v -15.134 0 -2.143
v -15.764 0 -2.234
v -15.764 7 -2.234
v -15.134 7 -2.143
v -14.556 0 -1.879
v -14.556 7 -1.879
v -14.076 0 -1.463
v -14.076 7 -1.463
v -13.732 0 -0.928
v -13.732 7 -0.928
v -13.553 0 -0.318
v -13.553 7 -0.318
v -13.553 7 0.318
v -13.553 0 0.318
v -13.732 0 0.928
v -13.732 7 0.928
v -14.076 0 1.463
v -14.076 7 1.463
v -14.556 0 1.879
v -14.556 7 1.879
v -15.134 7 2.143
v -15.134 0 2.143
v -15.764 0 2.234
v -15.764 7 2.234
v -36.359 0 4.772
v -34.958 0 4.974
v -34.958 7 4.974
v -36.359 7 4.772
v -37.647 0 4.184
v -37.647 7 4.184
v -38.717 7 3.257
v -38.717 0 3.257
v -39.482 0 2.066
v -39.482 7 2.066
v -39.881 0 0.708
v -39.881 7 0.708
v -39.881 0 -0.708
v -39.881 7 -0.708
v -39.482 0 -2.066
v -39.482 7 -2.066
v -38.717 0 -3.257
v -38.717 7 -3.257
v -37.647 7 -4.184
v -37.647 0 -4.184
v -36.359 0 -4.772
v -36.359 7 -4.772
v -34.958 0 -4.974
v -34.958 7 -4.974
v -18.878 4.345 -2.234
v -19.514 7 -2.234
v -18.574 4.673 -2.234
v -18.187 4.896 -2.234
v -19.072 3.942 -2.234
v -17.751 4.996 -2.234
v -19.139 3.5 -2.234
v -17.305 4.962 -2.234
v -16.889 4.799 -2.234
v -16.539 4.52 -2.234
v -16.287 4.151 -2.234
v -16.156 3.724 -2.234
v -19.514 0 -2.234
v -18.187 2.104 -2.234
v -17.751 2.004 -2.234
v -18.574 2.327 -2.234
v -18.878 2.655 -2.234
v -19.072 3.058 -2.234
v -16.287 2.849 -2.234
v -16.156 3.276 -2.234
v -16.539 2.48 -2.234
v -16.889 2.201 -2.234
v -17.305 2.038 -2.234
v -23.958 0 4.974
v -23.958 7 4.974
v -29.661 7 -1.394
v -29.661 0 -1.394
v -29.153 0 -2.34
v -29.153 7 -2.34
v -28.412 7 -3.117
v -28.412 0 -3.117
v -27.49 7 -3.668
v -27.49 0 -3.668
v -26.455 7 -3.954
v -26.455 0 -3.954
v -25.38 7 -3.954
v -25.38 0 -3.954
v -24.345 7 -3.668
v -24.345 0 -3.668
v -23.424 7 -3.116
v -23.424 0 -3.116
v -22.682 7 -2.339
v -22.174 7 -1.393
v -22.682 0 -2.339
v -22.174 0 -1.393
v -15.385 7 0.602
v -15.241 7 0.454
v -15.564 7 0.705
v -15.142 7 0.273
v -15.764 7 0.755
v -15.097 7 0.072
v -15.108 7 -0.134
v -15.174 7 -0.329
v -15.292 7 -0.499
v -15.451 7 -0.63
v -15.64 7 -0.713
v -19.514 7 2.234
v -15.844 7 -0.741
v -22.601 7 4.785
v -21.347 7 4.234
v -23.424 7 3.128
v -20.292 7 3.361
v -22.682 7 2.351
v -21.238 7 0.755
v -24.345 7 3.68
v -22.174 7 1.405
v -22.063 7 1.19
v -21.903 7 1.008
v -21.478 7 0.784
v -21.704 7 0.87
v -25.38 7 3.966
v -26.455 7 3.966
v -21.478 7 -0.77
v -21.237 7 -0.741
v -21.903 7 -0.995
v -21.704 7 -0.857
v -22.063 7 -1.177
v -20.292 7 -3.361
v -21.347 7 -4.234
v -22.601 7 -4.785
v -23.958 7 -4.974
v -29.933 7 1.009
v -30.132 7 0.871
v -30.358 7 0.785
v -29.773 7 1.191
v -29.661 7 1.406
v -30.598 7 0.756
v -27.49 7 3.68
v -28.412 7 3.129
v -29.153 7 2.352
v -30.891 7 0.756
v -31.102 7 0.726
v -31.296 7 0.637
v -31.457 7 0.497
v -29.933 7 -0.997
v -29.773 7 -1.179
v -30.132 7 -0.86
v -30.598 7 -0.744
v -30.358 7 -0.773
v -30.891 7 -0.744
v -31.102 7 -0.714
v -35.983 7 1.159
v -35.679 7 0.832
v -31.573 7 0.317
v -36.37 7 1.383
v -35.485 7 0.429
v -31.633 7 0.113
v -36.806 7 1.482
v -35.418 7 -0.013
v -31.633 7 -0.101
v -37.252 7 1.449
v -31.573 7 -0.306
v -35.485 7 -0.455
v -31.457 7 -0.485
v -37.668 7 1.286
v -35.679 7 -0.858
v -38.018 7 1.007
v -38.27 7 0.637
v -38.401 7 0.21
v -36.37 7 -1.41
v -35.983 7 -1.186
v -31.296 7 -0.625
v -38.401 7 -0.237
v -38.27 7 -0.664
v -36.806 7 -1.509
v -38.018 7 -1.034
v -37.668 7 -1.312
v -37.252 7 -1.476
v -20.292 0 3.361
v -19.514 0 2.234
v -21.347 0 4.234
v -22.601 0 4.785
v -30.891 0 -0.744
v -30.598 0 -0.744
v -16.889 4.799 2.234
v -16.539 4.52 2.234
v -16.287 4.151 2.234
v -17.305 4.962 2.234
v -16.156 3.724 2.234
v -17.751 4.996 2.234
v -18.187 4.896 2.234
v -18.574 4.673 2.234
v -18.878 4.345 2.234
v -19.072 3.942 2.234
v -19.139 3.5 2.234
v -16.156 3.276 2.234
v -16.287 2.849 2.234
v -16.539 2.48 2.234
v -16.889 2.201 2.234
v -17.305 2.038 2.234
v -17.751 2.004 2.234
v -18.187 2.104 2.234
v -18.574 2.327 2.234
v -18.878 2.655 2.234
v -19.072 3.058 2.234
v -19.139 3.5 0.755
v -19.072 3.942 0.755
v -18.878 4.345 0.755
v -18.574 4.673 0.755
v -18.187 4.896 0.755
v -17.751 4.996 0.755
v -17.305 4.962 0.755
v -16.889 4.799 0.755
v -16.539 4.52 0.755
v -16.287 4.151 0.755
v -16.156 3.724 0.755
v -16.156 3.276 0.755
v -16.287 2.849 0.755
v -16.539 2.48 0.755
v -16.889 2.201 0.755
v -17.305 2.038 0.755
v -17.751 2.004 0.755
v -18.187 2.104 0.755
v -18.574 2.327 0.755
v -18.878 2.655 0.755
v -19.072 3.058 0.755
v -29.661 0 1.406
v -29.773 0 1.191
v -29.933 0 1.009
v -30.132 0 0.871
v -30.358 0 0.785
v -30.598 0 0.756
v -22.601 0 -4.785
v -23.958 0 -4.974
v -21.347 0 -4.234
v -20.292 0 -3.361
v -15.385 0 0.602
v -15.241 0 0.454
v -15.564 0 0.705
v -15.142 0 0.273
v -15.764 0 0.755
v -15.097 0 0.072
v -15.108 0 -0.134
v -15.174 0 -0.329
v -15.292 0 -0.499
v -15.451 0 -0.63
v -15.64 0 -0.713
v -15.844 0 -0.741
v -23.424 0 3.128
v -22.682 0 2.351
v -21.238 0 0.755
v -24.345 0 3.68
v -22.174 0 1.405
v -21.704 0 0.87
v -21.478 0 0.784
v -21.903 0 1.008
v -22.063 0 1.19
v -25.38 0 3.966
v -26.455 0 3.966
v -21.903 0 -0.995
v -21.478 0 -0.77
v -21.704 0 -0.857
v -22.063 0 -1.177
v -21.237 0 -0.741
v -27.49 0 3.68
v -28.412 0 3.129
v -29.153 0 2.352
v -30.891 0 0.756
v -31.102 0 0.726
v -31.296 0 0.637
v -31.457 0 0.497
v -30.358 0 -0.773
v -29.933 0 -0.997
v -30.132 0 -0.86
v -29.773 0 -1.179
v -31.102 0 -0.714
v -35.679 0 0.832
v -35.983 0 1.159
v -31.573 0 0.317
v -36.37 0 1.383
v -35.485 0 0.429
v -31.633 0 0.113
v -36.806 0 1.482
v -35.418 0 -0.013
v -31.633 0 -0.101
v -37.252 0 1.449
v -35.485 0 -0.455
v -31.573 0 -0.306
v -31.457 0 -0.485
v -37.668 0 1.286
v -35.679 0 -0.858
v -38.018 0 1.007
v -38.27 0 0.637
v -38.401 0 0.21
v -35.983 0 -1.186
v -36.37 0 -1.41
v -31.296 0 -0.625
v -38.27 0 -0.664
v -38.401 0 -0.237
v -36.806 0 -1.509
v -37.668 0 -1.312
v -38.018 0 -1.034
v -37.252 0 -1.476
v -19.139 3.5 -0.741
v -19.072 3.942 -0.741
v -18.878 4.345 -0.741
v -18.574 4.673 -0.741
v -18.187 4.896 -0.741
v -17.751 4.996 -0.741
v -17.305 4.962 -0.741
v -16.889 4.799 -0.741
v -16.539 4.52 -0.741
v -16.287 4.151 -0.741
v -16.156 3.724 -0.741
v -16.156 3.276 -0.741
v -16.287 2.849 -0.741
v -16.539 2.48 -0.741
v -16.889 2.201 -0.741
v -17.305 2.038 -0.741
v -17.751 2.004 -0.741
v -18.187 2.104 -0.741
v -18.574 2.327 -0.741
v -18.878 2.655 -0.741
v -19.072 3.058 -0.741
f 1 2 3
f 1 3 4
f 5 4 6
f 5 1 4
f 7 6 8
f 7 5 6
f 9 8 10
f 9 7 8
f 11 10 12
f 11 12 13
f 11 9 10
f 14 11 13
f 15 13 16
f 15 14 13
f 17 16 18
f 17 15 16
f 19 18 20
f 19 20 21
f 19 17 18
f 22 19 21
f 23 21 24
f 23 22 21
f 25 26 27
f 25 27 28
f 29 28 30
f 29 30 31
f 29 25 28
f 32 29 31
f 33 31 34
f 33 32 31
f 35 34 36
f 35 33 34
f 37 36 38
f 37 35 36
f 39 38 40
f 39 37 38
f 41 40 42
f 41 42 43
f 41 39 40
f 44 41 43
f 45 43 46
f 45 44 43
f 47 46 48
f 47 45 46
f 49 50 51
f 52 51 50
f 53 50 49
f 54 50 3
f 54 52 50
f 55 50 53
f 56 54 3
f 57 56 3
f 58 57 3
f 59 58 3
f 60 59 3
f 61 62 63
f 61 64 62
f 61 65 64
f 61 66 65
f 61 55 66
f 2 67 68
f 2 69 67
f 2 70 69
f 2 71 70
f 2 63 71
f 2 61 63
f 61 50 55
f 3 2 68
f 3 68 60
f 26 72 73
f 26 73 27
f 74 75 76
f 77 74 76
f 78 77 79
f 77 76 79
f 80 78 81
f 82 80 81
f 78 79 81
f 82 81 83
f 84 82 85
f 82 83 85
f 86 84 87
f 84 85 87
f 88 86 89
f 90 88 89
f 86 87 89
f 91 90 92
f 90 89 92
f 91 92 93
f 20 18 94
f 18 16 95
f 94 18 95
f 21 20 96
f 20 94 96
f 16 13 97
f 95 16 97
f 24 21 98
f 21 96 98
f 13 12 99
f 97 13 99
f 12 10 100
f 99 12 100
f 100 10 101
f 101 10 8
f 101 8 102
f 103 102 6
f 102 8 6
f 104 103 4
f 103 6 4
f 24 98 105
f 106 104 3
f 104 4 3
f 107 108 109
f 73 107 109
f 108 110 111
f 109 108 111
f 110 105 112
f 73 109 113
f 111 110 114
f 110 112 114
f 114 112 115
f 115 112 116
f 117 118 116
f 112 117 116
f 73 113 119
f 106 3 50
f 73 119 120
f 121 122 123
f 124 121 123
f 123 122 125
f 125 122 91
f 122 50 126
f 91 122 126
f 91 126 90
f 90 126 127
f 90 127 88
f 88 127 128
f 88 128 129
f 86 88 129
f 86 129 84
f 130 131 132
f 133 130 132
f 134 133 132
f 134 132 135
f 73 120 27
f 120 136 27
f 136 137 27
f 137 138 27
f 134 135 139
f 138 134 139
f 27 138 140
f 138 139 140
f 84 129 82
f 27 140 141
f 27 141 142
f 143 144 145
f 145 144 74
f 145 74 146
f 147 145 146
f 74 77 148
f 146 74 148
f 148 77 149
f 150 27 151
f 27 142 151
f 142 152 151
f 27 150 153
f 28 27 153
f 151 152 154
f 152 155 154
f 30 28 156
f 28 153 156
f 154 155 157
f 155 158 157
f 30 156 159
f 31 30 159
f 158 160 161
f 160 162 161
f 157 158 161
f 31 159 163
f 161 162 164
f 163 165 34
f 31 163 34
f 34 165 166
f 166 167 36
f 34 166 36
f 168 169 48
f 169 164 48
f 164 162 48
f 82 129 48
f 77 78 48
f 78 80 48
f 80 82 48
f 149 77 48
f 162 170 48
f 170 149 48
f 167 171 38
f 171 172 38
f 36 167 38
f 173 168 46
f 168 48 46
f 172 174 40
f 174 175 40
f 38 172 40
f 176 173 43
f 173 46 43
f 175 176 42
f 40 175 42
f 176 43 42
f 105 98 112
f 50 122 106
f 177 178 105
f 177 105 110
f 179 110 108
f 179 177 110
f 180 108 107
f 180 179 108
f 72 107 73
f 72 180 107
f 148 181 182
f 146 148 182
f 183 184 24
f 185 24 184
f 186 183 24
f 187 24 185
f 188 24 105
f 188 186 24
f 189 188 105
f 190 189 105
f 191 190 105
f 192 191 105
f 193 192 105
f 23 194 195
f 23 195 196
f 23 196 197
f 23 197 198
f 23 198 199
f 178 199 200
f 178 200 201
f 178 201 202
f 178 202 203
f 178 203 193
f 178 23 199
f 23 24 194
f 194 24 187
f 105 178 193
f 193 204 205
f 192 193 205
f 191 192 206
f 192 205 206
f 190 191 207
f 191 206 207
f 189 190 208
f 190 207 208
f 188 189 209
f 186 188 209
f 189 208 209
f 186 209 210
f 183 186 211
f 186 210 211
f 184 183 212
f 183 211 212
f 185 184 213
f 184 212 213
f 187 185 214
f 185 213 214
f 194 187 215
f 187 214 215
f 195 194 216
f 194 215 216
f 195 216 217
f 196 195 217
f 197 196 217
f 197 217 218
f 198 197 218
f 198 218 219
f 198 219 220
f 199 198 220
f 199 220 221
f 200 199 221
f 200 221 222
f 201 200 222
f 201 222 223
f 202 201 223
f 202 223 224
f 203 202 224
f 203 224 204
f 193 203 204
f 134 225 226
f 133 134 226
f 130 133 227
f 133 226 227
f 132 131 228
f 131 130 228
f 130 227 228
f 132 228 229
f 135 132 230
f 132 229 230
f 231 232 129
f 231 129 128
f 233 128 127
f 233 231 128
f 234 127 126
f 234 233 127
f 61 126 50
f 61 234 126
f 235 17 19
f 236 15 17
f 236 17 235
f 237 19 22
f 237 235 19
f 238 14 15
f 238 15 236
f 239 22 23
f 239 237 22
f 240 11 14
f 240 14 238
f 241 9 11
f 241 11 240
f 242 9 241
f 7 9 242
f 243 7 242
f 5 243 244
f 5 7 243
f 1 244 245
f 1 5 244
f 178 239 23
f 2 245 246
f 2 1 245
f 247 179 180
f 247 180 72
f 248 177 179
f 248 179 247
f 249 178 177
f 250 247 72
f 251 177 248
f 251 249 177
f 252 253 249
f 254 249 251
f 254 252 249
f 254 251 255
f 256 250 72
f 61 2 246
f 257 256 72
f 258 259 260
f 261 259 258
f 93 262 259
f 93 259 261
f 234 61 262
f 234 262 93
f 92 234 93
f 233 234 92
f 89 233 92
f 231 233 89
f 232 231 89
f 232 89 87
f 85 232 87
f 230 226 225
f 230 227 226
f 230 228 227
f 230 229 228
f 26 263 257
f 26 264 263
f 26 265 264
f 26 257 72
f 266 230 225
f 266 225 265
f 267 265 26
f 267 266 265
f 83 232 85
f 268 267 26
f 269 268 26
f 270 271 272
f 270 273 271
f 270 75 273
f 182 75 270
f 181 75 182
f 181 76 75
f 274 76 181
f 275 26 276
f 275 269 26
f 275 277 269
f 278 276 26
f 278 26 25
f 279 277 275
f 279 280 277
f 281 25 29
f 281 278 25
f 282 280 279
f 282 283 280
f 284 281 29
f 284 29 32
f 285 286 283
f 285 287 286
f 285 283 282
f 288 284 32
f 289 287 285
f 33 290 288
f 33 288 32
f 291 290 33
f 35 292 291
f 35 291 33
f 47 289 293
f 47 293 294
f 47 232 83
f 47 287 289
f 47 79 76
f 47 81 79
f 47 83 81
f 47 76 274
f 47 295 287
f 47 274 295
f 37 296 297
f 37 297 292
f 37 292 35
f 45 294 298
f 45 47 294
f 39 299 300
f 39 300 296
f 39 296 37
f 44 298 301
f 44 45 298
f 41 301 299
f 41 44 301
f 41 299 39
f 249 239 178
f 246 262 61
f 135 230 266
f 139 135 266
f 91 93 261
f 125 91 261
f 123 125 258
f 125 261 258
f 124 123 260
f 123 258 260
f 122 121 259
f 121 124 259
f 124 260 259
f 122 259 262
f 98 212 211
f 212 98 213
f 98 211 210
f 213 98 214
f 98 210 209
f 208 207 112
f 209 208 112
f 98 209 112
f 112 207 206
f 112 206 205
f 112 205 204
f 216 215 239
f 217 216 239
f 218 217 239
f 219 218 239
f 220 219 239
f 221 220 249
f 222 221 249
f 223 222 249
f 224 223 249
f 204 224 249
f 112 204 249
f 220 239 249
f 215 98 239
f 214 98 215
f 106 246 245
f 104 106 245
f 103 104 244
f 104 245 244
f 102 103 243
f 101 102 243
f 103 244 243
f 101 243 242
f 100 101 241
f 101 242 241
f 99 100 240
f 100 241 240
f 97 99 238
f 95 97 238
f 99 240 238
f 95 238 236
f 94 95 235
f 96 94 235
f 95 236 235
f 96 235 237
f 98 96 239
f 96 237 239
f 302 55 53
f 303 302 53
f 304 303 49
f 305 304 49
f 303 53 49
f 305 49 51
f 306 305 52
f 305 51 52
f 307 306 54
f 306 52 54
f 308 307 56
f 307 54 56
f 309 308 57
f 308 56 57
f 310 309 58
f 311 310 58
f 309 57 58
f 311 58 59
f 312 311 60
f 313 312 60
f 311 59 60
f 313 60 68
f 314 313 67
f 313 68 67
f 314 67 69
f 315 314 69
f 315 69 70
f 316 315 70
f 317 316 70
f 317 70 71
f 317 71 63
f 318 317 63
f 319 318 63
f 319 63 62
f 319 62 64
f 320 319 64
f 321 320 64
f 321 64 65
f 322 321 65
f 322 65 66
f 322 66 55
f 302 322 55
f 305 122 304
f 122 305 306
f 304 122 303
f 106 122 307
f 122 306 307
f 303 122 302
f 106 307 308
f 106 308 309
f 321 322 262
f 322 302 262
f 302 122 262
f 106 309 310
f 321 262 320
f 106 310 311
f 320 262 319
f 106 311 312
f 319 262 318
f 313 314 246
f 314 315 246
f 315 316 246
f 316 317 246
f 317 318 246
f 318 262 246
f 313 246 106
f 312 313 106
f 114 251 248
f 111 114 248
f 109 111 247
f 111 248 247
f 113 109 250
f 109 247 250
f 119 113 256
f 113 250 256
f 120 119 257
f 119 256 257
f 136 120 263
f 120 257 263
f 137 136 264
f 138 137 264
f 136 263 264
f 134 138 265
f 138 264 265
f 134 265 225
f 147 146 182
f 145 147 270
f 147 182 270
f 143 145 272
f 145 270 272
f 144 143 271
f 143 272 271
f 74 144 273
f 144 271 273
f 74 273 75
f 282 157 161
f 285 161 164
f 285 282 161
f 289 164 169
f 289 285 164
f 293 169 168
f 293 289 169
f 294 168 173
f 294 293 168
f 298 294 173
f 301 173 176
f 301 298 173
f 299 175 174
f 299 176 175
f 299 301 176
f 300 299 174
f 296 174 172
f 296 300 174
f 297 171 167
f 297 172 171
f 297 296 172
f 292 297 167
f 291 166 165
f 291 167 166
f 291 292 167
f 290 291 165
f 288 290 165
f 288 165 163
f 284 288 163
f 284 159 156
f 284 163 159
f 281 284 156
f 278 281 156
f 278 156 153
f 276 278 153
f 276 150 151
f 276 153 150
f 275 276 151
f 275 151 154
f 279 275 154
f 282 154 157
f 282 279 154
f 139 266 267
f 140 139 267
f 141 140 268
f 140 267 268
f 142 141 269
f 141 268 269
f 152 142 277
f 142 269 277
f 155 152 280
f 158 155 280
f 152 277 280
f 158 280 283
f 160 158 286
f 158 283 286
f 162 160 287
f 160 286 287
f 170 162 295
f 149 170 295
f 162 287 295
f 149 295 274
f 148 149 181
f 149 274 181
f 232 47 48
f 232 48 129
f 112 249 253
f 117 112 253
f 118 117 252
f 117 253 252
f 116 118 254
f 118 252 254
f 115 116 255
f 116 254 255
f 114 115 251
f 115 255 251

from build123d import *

# Parameters (mm, degrees)
BOSS_EXTRUDE2_DEPTH = 7
SKETCH2_R           = 1.5
CUT_EXTRUDE4_DEPTH  = 8
SKETCH4_R           = 1.5
CUT_EXTRUDE5_DEPTH  = 8.20758232


with BuildPart() as part:
    # Sketch1 → Boss-Extrude2 (new body)
    with BuildSketch(Plane(origin=(0, 0, 0), x_dir=(1, 0, 0), z_dir=(0, 1, 0))):
        with BuildLine():
            Line((-19.513780389, 2.233669643), (-15.763780389, 2.233669643))
            ThreePointArc((-15.763780389, 2.233669643), (-13.530110746, 0), (-15.763780389, -2.233669643))
            Line((-15.763780389, -2.233669643), (-19.513780389, -2.233669643))
            ThreePointArc((-19.513780389, -2.233669643), (-21.347407319, -4.233785839), (-23.957936917, -4.973912677))
            Line((-23.957936917, -4.973912677), (-34.957936917, -4.973912677))
            ThreePointArc((-34.957936917, -4.973912677), (-39.931849593, 0), (-34.957936917, 4.973912677))
            Line((-34.957936917, 4.973912677), (-23.957936917, 4.973912677))
            ThreePointArc((-23.957936917, 4.973912677), (-21.347407319, 4.233785839), (-19.513780389, 2.233669643))
        make_face()
    extrude(amount=BOSS_EXTRUDE2_DEPTH)

    # Sketch2 → Cut-Extrude4 (cut, through all)
    with BuildSketch(Plane(origin=(0, 0, 0), x_dir=(1, 0, 0), z_dir=(0, 1, 0))):
        with Locations((-36.918050981, 0.013343653)):
            Circle(SKETCH2_R)
        with BuildLine():
            Line((-15.763780389, -0.754616632), (-21.237726657, -0.754616632))
            ThreePointArc((-21.237726657, -0.754616632), (-21.807814369, -0.933032796), (-22.174476357, -1.404616632))
            ThreePointArc((-22.174476357, -1.404616632), (-25.917504746, -4.002240599), (-29.661243101, -1.405639951))
            ThreePointArc((-29.661243101, -1.405639951), (-30.027921677, -0.934234264), (-30.597897087, -0.755896014))
            Line((-30.597897087, -0.755896014), (-30.890644095, -0.755896014))
            ThreePointArc((-30.890644095, -0.755896014), (-31.640644095, -0.005896014), (-30.890644095, 0.744103986))
            Line((-30.890644095, 0.744103986), (-30.597897087, 0.744103986))
            ThreePointArc((-30.597897087, 0.744103986), (-30.027921677, 0.922442235), (-29.661243101, 1.393847922))
            ThreePointArc((-29.661243101, 1.393847922), (-25.917504746, 3.99044857), (-22.174476357, 1.392824603))
            ThreePointArc((-22.174476357, 1.392824603), (-21.807928303, 0.920033725), (-21.237080152, 0.74108938))
            Line((-21.237080152, 0.74108938), (-15.843921166, 0.74108938))
            ThreePointArc((-15.843921166, 0.74108938), (-15.094995432, 0.031217246), (-15.763780389, -0.754616632))
        make_face()
    extrude(amount=CUT_EXTRUDE4_DEPTH, mode=Mode.SUBTRACT)

    # Sketch4 → Cut-Extrude5 (cut, through all)
    with BuildSketch(Plane(origin=(0, 0, -2.233669643), x_dir=(-1, 0, 0), z_dir=(0, 0, -1))):
        with Locations((17.638780389, 3.5)):
            Circle(SKETCH4_R)
    extrude(amount=-CUT_EXTRUDE5_DEPTH, mode=Mode.SUBTRACT)


solid = part.part
